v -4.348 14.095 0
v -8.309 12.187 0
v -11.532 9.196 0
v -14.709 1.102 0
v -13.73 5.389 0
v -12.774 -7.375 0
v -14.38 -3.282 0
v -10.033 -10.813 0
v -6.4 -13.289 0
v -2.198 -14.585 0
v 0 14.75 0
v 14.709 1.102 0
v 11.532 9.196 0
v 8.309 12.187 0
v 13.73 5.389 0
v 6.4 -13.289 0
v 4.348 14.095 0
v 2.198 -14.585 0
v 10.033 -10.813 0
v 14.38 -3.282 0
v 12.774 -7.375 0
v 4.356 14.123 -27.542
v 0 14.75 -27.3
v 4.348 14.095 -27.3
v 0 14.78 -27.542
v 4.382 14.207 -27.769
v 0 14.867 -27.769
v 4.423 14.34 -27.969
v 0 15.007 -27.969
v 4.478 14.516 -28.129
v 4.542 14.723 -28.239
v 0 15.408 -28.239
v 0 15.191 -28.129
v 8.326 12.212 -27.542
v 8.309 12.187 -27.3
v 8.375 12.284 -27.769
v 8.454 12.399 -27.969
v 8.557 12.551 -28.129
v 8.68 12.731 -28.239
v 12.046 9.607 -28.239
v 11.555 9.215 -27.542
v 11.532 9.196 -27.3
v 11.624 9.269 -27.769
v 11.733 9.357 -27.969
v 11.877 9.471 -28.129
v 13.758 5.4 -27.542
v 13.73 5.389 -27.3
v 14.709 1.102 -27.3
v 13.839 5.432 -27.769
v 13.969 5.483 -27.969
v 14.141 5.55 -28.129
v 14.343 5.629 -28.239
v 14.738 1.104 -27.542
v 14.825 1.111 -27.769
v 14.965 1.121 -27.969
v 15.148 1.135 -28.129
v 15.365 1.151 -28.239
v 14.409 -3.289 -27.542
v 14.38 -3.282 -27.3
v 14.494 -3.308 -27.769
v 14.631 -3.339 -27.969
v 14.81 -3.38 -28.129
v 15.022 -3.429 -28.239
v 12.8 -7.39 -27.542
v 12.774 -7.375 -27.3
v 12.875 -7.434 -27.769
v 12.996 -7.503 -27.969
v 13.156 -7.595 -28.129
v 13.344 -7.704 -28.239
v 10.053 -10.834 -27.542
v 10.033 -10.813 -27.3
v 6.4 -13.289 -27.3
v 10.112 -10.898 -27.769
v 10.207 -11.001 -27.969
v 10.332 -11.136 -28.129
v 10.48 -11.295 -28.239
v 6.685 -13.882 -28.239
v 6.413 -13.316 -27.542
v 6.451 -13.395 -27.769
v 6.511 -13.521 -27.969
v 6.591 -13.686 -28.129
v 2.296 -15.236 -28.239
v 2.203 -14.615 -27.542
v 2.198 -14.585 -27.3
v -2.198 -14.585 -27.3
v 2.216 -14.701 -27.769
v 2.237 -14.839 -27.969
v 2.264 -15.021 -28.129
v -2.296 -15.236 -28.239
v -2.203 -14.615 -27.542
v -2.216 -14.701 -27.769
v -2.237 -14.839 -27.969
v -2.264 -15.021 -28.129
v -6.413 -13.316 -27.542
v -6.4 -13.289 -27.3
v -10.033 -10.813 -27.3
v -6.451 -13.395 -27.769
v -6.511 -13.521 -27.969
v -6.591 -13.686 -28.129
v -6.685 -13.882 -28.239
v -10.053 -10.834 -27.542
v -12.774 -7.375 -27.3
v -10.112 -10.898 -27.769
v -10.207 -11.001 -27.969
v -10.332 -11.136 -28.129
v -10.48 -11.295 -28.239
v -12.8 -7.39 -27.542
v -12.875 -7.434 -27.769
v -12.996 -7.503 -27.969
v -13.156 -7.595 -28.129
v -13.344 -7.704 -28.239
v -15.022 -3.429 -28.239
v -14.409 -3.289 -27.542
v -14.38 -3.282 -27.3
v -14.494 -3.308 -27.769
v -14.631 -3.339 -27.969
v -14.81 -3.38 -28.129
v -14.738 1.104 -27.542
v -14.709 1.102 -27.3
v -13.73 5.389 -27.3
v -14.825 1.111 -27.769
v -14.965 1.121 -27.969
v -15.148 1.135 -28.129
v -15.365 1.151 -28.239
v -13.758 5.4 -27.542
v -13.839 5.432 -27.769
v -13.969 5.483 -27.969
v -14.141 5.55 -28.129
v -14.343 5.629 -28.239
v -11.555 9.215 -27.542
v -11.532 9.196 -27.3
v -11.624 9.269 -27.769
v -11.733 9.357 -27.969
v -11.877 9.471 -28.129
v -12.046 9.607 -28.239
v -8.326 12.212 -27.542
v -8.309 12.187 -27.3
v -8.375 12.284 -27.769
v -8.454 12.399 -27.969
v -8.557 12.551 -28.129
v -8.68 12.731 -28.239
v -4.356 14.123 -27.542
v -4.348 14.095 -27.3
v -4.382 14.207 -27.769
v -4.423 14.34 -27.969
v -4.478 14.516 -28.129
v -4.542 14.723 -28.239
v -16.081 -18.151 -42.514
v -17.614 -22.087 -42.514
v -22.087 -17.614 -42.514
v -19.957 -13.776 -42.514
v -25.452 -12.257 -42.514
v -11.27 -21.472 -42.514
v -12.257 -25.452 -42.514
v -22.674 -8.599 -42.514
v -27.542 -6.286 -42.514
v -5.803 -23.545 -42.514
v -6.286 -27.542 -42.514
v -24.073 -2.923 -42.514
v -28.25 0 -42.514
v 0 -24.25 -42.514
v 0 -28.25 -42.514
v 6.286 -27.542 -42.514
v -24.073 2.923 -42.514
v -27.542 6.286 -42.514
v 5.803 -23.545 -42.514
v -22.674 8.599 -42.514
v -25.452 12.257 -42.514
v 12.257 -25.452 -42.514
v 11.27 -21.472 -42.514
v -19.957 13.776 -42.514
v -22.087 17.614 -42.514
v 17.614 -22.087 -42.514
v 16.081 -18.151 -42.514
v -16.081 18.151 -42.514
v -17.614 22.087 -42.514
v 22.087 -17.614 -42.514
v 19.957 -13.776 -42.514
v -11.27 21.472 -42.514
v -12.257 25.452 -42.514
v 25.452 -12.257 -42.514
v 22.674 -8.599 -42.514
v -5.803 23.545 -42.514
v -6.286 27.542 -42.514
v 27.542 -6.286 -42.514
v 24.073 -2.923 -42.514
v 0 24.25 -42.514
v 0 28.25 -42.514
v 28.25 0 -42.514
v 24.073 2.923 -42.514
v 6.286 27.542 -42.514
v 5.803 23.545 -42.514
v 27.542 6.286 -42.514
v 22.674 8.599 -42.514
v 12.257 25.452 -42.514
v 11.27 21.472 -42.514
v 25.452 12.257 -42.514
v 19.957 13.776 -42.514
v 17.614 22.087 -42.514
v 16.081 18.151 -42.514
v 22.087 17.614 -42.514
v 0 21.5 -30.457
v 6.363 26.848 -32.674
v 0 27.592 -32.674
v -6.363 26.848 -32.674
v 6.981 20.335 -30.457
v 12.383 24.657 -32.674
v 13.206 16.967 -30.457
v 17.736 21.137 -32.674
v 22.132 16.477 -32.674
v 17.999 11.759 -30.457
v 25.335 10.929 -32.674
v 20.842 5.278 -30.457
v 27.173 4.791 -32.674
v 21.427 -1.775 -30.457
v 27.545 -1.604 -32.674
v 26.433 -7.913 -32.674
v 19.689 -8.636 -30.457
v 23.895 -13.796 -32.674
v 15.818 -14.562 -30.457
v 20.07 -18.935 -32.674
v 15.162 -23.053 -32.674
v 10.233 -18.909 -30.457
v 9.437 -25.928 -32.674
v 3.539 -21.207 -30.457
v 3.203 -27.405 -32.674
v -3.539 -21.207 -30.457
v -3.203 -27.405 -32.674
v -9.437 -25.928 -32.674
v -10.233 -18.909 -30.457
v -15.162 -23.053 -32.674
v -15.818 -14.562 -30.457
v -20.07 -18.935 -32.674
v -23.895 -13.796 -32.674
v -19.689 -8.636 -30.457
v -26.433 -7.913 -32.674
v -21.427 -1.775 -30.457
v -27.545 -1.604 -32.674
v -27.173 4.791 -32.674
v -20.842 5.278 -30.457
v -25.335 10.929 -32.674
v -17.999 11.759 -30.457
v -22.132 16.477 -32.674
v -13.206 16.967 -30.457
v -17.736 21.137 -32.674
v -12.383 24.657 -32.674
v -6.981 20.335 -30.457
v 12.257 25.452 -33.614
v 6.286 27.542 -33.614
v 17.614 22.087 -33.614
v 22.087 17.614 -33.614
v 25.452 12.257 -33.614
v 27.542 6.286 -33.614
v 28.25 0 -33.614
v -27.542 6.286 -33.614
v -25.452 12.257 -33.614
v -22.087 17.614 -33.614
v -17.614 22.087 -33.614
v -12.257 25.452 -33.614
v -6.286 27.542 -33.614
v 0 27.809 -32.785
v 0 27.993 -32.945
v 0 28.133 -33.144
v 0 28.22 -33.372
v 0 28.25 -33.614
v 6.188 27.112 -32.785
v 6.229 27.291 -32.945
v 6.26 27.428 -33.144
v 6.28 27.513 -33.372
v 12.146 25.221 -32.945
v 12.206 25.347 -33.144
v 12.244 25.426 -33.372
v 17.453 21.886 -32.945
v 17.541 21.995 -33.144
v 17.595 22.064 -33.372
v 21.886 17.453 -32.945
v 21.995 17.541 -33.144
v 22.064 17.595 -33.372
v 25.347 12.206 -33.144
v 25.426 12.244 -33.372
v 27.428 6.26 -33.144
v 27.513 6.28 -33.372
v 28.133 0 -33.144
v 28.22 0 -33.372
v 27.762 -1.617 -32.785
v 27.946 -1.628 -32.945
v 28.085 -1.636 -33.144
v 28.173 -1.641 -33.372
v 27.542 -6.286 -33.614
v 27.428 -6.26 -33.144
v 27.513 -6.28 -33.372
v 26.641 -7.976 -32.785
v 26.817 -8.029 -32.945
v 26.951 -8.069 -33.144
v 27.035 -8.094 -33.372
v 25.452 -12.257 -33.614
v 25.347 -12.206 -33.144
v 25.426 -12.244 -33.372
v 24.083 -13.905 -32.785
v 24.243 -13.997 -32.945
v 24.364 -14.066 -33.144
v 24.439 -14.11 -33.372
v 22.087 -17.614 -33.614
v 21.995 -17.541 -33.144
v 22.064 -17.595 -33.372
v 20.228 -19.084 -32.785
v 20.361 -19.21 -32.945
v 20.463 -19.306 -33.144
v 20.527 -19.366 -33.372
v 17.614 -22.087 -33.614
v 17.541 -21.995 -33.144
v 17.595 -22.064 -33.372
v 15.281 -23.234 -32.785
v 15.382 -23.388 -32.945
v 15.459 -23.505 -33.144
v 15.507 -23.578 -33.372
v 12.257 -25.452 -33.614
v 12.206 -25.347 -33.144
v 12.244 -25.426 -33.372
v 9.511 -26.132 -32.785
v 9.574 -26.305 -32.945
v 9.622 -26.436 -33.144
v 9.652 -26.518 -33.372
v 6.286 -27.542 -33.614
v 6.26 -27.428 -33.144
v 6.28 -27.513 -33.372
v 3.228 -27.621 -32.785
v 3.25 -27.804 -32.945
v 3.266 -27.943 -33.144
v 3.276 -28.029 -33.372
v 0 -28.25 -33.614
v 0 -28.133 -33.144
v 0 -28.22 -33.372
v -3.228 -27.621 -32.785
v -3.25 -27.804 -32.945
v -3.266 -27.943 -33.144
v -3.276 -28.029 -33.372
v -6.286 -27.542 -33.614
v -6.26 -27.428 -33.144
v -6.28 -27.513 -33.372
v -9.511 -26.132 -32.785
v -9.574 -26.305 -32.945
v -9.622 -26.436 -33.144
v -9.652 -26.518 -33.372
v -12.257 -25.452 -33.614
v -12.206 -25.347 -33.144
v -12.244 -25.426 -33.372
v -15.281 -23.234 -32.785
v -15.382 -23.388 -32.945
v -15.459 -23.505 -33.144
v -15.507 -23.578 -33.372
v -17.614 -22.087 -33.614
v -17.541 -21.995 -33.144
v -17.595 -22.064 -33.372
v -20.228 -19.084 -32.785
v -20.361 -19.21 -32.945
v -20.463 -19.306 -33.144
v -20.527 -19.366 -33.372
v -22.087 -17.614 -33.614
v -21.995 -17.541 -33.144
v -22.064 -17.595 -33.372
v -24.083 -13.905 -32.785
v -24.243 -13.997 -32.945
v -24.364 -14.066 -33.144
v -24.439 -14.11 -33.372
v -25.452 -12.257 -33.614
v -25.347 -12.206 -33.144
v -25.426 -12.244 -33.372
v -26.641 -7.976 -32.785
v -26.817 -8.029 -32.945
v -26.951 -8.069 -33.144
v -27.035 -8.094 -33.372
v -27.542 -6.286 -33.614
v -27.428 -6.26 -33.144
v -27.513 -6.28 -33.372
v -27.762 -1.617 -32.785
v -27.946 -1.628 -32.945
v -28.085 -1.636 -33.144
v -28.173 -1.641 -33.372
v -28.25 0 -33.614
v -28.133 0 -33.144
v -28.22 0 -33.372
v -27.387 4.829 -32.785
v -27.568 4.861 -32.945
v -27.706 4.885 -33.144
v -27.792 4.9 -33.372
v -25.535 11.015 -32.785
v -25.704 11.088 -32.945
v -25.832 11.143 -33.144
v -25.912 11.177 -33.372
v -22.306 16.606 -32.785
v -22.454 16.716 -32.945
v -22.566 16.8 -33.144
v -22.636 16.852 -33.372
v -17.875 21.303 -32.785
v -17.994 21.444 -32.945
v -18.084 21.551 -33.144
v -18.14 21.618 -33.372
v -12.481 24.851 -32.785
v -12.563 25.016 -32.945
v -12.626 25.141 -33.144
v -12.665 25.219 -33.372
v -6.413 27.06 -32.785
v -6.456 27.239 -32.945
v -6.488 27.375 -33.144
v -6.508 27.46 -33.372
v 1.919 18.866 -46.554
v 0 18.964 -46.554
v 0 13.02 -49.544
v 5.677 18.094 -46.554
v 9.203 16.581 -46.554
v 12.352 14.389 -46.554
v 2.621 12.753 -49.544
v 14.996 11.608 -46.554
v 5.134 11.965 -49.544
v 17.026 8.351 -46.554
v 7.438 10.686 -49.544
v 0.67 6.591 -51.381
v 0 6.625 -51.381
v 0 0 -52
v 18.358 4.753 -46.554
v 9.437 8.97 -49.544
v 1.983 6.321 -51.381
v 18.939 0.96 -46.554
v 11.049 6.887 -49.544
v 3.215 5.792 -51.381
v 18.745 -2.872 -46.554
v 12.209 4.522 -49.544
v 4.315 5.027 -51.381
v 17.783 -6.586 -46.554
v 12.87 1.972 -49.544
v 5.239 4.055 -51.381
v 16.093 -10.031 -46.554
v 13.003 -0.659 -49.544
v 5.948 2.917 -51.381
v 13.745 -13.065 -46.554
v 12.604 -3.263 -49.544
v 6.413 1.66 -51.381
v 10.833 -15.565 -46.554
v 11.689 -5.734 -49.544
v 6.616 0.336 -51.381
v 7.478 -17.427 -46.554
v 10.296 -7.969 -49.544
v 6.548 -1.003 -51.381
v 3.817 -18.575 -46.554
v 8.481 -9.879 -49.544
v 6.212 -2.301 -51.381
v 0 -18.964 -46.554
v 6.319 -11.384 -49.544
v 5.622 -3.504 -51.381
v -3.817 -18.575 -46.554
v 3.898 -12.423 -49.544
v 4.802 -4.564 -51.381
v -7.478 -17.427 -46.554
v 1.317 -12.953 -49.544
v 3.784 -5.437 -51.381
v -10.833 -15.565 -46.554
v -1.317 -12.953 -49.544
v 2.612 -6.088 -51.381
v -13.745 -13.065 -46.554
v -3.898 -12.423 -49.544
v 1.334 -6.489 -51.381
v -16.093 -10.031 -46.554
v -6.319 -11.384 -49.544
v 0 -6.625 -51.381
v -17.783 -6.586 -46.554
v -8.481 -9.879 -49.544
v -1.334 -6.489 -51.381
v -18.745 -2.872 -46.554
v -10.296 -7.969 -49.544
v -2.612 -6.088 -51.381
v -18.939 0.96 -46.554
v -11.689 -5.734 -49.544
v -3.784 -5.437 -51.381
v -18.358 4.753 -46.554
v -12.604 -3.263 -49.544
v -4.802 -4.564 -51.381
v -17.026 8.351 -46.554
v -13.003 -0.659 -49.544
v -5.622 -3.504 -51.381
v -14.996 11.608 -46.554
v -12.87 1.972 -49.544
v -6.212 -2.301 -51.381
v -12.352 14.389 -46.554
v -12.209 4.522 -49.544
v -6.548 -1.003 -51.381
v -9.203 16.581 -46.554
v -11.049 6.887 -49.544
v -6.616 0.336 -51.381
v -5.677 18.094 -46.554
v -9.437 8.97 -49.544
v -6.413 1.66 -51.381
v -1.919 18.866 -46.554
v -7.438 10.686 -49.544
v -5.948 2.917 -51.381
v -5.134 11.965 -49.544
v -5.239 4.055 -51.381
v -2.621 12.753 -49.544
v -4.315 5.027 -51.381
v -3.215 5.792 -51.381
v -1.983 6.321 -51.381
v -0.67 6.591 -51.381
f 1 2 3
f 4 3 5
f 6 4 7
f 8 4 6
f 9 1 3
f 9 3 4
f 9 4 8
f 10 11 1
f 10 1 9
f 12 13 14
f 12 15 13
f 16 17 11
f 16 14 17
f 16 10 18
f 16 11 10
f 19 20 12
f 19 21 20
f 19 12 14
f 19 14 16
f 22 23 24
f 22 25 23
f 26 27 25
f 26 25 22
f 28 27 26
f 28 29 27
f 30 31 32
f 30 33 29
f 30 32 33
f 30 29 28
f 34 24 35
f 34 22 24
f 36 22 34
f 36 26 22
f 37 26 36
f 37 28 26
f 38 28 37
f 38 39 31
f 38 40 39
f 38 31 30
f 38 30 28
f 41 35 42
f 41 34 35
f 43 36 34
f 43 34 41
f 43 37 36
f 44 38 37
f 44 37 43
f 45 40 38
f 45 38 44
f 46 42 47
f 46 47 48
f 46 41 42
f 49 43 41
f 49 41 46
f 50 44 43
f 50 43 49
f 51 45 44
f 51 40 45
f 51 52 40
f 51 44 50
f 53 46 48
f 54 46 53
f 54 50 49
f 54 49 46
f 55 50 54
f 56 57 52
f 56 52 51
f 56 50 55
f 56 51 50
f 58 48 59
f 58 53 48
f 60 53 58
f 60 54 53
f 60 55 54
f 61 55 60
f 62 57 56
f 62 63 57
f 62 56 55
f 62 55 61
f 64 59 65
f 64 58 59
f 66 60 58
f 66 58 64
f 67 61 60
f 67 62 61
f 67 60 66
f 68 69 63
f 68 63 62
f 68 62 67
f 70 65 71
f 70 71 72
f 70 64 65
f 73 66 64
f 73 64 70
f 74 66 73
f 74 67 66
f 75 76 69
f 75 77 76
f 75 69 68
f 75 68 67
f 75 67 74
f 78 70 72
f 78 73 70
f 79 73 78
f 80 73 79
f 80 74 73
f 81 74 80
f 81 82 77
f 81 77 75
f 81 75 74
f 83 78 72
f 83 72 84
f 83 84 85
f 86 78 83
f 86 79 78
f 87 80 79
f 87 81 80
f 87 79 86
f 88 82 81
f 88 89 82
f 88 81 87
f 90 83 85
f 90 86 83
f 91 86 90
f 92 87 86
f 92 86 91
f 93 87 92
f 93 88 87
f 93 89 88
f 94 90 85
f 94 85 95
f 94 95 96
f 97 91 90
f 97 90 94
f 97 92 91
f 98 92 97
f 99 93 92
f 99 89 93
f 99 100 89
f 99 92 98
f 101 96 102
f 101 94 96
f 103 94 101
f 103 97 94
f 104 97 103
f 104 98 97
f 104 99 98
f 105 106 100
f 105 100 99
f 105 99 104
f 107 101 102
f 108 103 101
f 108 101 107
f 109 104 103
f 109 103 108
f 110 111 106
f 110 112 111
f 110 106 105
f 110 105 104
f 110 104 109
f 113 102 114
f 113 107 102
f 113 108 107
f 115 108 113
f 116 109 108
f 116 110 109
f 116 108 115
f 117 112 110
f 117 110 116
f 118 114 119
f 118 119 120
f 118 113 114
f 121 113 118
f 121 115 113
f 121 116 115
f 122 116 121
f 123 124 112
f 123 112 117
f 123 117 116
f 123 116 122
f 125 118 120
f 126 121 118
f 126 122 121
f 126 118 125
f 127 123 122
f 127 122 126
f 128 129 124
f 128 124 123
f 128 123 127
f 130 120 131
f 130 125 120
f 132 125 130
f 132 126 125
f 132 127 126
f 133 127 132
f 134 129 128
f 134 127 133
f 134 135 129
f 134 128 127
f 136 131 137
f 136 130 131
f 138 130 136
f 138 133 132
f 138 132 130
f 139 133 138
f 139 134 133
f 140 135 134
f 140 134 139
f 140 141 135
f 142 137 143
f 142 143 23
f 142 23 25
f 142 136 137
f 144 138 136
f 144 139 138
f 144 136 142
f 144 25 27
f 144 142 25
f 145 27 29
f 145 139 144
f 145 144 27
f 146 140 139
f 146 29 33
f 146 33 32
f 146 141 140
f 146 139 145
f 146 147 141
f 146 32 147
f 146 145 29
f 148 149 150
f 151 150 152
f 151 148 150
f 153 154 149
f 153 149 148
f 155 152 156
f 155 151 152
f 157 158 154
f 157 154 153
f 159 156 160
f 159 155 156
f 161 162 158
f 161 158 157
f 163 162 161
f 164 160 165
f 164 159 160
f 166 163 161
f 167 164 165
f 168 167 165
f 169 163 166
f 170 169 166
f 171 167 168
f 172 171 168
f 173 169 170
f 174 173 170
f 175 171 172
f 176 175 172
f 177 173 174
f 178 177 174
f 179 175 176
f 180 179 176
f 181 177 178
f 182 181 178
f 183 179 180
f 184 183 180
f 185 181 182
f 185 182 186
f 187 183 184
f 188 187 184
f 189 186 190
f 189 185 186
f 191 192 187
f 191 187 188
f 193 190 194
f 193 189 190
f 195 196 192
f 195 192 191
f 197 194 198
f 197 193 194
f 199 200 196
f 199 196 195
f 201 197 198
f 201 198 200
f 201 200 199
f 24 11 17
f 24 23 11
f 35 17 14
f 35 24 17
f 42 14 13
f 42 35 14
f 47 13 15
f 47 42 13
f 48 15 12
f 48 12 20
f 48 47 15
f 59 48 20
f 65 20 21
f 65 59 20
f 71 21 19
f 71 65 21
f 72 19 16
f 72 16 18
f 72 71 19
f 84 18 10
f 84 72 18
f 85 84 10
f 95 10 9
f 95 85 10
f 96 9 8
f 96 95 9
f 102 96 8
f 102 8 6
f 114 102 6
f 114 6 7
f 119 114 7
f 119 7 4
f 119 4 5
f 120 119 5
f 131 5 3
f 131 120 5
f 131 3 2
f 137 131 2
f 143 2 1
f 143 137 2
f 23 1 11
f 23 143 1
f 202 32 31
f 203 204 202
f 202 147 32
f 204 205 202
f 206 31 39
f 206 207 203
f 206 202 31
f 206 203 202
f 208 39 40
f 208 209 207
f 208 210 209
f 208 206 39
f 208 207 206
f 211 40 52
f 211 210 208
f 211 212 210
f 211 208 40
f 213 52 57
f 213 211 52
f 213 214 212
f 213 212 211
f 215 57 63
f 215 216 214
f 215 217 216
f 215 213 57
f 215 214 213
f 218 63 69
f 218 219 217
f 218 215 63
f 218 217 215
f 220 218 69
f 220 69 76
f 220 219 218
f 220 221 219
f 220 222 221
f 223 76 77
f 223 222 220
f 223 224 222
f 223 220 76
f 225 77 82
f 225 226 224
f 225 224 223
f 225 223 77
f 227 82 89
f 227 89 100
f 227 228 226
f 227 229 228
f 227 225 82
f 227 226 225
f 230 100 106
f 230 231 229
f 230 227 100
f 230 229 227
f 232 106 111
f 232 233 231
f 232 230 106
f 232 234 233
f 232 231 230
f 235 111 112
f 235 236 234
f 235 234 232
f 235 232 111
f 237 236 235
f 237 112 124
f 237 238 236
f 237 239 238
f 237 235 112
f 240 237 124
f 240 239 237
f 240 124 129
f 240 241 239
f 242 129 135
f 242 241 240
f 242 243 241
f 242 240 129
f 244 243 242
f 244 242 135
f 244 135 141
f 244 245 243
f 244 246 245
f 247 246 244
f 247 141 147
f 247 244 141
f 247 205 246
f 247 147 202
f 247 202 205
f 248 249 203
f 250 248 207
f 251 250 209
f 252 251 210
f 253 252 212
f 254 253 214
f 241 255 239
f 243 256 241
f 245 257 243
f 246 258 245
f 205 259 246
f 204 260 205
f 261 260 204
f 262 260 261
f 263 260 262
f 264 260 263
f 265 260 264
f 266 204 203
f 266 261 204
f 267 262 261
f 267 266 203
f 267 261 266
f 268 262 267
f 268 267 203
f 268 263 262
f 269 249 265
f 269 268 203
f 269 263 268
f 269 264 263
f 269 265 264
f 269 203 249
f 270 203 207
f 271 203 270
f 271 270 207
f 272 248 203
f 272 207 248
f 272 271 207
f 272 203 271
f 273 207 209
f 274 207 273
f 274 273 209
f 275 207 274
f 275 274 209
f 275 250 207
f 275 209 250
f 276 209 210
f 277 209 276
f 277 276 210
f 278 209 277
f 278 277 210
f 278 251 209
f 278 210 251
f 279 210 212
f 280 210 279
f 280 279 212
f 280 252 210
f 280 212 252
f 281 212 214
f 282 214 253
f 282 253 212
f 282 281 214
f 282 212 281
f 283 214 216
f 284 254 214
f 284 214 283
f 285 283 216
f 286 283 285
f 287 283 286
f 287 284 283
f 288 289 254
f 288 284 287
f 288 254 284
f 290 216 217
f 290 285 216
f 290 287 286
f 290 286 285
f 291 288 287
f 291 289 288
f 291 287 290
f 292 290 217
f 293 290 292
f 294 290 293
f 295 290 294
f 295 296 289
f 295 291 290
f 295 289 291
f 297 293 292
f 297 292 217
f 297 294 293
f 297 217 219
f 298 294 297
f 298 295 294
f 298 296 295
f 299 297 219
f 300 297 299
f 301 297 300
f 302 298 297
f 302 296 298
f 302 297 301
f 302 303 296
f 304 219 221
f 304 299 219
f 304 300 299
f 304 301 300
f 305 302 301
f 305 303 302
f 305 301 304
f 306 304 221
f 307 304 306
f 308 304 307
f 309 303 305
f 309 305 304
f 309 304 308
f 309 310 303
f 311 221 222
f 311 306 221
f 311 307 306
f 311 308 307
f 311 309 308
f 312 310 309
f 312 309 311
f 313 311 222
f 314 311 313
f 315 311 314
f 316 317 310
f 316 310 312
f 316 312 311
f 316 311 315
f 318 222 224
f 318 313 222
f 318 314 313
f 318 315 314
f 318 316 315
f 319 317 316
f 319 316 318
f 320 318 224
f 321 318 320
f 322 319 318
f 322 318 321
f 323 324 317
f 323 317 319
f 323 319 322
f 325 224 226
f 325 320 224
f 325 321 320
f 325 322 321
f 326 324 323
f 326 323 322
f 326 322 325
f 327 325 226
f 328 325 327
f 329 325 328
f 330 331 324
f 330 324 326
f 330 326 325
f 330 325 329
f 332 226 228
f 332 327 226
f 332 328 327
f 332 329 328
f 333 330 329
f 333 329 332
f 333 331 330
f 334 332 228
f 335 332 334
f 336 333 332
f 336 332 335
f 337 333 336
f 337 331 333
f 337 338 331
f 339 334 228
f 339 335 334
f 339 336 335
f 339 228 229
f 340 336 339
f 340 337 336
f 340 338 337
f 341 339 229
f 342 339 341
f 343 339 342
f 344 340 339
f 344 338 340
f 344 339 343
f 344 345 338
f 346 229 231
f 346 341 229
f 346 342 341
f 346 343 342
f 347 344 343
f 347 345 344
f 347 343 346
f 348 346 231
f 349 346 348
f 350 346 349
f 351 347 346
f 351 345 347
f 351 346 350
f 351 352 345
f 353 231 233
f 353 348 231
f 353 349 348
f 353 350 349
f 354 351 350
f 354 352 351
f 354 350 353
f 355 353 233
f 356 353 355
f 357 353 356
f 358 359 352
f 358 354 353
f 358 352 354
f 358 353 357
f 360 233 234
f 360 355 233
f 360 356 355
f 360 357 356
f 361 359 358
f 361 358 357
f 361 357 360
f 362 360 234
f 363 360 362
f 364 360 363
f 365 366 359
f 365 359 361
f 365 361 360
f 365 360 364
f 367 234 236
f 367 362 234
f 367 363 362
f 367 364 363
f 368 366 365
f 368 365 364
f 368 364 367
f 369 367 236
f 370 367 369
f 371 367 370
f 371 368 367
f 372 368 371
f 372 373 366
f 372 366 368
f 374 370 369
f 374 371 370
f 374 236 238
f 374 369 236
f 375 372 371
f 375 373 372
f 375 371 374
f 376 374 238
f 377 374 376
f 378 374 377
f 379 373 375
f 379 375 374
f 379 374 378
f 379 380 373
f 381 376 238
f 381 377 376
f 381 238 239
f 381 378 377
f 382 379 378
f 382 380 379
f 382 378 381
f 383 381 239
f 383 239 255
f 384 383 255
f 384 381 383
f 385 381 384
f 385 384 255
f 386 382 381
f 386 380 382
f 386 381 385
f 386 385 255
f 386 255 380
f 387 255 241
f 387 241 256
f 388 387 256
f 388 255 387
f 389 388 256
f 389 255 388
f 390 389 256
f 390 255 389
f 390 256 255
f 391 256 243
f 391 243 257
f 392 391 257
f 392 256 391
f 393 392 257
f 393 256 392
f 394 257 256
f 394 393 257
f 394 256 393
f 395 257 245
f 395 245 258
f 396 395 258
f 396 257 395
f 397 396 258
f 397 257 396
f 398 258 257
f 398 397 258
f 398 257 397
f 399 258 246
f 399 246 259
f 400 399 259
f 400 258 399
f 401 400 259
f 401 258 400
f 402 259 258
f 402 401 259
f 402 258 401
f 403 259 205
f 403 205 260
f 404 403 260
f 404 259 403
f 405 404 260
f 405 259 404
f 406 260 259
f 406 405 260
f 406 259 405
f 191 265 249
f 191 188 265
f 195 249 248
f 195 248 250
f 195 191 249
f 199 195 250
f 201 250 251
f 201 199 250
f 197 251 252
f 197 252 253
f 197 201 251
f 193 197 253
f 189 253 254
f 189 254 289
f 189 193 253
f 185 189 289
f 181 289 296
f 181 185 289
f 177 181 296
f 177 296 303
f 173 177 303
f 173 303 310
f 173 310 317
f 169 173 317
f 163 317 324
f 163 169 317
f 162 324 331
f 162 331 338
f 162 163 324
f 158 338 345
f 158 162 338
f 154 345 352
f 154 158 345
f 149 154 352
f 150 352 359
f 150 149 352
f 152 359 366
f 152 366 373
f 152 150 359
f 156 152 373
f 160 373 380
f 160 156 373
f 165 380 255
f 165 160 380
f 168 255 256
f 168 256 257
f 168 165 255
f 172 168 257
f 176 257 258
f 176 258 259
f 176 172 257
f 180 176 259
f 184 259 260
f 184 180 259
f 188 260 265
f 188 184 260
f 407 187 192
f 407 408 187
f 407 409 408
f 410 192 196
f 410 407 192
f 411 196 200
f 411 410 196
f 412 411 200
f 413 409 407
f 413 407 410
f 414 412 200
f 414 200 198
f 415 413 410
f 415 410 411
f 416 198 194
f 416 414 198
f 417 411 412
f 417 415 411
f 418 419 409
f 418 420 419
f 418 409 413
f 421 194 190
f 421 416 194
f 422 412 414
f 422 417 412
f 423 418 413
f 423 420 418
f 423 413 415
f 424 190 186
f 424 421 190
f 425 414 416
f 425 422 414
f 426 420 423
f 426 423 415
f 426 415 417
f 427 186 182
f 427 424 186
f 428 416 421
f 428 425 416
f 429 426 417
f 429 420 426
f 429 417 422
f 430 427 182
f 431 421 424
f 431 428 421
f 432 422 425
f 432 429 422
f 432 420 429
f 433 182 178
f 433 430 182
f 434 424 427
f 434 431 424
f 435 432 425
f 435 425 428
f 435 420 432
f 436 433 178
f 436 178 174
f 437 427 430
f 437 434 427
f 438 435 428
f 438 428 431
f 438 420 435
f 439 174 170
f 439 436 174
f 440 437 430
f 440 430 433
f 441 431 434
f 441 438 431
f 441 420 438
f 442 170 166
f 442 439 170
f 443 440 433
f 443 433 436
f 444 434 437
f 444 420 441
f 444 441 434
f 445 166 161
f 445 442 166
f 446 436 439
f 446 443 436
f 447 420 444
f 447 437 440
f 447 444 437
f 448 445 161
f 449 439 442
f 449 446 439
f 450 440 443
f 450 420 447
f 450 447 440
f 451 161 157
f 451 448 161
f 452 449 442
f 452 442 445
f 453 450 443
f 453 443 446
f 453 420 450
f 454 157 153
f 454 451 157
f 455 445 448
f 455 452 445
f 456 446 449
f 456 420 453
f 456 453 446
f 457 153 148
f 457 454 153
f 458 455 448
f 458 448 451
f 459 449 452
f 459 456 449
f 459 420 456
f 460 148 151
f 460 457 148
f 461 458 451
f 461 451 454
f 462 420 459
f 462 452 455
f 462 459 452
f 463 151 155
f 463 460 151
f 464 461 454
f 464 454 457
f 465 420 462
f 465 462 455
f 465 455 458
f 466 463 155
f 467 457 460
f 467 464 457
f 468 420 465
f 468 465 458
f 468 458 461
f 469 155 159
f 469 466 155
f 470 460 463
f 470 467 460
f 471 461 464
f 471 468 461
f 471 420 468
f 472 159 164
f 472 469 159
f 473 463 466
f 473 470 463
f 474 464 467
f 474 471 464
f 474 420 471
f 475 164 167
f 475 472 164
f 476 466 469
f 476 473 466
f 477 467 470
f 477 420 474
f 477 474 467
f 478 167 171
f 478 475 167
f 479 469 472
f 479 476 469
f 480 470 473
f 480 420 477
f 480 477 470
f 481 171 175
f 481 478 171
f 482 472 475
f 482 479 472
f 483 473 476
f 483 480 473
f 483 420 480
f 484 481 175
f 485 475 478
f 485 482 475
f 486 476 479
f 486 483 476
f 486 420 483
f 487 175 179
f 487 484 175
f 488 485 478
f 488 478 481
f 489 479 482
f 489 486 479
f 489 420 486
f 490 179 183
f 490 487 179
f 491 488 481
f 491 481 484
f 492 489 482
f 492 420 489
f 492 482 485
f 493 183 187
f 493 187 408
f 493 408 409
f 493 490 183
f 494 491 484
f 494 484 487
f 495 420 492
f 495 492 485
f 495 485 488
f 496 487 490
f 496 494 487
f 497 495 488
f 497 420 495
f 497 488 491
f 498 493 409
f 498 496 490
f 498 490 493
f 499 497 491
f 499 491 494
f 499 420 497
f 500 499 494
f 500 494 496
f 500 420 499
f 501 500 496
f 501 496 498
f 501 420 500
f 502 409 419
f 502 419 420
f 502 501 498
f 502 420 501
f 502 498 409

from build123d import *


with BuildPart() as part:
    # Sketch1 → Revolve1 (revolve)
    with BuildSketch(Plane(origin=(0, 0, 0), x_dir=(0, 0, -1), z_dir=(1, 0, 0))):
        with BuildLine():
            Line((0, 0), (0, 14.75))
            Line((0, 14.75), (27.299792462, 14.75))
            ThreePointArc((27.299792462, 14.75), (27.873368898, 14.930847956), (28.239485083, 15.407979857))
            Line((28.239485083, 15.407979857), (32.67411308, 27.592020143))
            ThreePointArc((32.67411308, 27.592020143), (33.040229264, 28.069152044), (33.613805701, 28.25))
            Line((33.613805701, 28.25), (42.513598163, 28.25))
            Line((42.513598163, 28.25), (42.513598163, 24.25))
            ThreePointArc((42.513598163, 24.25), (49.544009667, 13.019738091), (52, 0))
            Line((52, 0), (0, 0))
        make_face()
    revolve(axis=Axis((0, 0, 0), (0, 0, -1)))


solid = part.part
